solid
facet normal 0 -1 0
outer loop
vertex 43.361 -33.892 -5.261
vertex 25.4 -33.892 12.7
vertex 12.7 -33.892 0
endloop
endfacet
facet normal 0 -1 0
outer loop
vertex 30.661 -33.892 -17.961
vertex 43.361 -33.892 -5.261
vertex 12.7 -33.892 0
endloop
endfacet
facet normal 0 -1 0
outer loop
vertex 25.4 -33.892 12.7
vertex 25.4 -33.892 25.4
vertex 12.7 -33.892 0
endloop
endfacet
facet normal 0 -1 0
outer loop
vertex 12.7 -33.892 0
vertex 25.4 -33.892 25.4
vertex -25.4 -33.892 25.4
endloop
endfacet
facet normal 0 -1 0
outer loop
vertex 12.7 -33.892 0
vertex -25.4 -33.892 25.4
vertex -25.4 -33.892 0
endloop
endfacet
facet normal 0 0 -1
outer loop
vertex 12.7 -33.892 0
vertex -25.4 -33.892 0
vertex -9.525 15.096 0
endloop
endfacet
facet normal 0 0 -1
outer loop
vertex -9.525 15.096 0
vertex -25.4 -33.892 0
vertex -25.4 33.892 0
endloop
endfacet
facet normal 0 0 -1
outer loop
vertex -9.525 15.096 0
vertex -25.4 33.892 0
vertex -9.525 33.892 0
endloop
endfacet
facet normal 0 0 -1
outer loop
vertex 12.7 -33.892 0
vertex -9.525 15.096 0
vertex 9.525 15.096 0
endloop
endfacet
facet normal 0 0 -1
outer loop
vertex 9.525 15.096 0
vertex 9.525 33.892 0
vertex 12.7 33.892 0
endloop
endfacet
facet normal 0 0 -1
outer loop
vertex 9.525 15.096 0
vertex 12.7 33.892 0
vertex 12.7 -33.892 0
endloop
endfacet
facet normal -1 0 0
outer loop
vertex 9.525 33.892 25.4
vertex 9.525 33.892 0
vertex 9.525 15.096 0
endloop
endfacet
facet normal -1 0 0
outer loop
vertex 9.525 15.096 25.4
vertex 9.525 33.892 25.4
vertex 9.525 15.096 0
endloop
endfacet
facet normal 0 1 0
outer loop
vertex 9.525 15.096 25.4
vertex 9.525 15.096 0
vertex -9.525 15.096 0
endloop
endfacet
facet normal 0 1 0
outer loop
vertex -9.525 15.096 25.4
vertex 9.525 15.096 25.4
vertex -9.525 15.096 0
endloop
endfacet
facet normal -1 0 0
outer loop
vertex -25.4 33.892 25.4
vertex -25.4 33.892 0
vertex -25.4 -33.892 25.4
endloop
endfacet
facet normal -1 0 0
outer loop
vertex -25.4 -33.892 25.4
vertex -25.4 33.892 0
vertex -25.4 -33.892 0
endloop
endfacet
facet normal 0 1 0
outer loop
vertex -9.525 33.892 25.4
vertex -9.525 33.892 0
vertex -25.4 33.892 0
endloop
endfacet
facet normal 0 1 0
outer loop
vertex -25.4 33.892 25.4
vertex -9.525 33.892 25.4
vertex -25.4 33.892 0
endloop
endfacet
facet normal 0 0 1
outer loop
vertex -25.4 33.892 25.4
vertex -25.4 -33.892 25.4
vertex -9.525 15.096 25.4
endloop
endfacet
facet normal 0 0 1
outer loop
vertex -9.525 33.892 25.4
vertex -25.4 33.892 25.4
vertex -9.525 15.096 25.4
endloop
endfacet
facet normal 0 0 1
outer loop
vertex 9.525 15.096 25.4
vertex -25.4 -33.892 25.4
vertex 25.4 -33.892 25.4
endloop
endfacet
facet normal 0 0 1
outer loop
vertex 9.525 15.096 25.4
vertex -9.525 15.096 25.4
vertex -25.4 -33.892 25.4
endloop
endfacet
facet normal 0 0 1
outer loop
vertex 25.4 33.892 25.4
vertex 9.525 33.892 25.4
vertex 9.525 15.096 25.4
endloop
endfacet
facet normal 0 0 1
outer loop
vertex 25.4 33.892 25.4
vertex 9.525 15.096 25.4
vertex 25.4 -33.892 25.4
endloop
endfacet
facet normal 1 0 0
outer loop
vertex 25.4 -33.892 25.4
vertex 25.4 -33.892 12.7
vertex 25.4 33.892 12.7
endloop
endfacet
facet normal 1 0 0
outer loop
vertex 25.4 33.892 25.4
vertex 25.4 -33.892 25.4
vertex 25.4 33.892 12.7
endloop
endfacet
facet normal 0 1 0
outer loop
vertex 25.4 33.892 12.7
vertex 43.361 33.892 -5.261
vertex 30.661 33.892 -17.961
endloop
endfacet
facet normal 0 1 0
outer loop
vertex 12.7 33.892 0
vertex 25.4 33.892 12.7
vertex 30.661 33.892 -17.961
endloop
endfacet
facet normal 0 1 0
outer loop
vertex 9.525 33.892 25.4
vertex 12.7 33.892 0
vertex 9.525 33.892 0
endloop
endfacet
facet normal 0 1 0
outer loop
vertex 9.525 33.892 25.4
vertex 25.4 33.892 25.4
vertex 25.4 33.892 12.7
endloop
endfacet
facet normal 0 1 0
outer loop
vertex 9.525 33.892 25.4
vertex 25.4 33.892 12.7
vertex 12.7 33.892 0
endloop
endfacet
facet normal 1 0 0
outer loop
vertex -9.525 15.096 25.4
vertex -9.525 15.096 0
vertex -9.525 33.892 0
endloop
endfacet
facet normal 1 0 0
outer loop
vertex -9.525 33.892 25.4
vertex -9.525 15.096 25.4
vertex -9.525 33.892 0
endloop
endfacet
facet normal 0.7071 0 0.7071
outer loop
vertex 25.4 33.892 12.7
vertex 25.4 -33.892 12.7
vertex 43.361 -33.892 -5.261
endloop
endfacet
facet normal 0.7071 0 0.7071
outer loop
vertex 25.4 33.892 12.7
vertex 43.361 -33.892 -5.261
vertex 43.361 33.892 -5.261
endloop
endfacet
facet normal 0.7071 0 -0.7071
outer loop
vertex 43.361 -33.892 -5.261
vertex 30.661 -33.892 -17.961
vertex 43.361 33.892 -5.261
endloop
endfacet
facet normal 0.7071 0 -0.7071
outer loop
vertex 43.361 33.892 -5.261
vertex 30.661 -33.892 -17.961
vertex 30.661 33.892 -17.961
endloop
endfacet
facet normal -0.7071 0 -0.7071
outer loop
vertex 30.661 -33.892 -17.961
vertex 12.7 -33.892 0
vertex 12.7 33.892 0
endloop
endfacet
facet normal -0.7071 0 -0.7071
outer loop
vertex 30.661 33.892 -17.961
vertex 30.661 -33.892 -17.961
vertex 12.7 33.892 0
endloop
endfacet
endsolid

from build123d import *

# Parameters (mm, degrees)
F1_DEPTH = 25.4
F2_SIZE  = 12.7
F3_DEPTH = 25.4


with BuildPart() as f1:
    # F0 (on Top) → F1 (new body)
    with BuildSketch(Plane.XY):
        Polygon((-25.4, -33.8918231428), (25.4, -33.8918231428), (25.4, 33.8918231428), (9.525, 33.8918231428), (9.525, 15.0958231428), (-9.525, 15.0958231428), (-9.525, 33.8918231428), (-25.4, 33.8918231428), align=None)
    extrude(amount=F1_DEPTH)

    # F2
    f2_edges = [f1.edges().sort_by_distance(p)[0] for p in [
        (25.4, 0, 0),
    ]]
    chamfer(f2_edges, length=F2_SIZE)

    # F3 (add): a face of the model
    f3_faces = [f1.faces().sort_by_distance(p)[0] for p in [
        (19.05, 0, 6.35),
    ]]
    extrude(f3_faces, amount=F3_DEPTH)


solid = f1.part
